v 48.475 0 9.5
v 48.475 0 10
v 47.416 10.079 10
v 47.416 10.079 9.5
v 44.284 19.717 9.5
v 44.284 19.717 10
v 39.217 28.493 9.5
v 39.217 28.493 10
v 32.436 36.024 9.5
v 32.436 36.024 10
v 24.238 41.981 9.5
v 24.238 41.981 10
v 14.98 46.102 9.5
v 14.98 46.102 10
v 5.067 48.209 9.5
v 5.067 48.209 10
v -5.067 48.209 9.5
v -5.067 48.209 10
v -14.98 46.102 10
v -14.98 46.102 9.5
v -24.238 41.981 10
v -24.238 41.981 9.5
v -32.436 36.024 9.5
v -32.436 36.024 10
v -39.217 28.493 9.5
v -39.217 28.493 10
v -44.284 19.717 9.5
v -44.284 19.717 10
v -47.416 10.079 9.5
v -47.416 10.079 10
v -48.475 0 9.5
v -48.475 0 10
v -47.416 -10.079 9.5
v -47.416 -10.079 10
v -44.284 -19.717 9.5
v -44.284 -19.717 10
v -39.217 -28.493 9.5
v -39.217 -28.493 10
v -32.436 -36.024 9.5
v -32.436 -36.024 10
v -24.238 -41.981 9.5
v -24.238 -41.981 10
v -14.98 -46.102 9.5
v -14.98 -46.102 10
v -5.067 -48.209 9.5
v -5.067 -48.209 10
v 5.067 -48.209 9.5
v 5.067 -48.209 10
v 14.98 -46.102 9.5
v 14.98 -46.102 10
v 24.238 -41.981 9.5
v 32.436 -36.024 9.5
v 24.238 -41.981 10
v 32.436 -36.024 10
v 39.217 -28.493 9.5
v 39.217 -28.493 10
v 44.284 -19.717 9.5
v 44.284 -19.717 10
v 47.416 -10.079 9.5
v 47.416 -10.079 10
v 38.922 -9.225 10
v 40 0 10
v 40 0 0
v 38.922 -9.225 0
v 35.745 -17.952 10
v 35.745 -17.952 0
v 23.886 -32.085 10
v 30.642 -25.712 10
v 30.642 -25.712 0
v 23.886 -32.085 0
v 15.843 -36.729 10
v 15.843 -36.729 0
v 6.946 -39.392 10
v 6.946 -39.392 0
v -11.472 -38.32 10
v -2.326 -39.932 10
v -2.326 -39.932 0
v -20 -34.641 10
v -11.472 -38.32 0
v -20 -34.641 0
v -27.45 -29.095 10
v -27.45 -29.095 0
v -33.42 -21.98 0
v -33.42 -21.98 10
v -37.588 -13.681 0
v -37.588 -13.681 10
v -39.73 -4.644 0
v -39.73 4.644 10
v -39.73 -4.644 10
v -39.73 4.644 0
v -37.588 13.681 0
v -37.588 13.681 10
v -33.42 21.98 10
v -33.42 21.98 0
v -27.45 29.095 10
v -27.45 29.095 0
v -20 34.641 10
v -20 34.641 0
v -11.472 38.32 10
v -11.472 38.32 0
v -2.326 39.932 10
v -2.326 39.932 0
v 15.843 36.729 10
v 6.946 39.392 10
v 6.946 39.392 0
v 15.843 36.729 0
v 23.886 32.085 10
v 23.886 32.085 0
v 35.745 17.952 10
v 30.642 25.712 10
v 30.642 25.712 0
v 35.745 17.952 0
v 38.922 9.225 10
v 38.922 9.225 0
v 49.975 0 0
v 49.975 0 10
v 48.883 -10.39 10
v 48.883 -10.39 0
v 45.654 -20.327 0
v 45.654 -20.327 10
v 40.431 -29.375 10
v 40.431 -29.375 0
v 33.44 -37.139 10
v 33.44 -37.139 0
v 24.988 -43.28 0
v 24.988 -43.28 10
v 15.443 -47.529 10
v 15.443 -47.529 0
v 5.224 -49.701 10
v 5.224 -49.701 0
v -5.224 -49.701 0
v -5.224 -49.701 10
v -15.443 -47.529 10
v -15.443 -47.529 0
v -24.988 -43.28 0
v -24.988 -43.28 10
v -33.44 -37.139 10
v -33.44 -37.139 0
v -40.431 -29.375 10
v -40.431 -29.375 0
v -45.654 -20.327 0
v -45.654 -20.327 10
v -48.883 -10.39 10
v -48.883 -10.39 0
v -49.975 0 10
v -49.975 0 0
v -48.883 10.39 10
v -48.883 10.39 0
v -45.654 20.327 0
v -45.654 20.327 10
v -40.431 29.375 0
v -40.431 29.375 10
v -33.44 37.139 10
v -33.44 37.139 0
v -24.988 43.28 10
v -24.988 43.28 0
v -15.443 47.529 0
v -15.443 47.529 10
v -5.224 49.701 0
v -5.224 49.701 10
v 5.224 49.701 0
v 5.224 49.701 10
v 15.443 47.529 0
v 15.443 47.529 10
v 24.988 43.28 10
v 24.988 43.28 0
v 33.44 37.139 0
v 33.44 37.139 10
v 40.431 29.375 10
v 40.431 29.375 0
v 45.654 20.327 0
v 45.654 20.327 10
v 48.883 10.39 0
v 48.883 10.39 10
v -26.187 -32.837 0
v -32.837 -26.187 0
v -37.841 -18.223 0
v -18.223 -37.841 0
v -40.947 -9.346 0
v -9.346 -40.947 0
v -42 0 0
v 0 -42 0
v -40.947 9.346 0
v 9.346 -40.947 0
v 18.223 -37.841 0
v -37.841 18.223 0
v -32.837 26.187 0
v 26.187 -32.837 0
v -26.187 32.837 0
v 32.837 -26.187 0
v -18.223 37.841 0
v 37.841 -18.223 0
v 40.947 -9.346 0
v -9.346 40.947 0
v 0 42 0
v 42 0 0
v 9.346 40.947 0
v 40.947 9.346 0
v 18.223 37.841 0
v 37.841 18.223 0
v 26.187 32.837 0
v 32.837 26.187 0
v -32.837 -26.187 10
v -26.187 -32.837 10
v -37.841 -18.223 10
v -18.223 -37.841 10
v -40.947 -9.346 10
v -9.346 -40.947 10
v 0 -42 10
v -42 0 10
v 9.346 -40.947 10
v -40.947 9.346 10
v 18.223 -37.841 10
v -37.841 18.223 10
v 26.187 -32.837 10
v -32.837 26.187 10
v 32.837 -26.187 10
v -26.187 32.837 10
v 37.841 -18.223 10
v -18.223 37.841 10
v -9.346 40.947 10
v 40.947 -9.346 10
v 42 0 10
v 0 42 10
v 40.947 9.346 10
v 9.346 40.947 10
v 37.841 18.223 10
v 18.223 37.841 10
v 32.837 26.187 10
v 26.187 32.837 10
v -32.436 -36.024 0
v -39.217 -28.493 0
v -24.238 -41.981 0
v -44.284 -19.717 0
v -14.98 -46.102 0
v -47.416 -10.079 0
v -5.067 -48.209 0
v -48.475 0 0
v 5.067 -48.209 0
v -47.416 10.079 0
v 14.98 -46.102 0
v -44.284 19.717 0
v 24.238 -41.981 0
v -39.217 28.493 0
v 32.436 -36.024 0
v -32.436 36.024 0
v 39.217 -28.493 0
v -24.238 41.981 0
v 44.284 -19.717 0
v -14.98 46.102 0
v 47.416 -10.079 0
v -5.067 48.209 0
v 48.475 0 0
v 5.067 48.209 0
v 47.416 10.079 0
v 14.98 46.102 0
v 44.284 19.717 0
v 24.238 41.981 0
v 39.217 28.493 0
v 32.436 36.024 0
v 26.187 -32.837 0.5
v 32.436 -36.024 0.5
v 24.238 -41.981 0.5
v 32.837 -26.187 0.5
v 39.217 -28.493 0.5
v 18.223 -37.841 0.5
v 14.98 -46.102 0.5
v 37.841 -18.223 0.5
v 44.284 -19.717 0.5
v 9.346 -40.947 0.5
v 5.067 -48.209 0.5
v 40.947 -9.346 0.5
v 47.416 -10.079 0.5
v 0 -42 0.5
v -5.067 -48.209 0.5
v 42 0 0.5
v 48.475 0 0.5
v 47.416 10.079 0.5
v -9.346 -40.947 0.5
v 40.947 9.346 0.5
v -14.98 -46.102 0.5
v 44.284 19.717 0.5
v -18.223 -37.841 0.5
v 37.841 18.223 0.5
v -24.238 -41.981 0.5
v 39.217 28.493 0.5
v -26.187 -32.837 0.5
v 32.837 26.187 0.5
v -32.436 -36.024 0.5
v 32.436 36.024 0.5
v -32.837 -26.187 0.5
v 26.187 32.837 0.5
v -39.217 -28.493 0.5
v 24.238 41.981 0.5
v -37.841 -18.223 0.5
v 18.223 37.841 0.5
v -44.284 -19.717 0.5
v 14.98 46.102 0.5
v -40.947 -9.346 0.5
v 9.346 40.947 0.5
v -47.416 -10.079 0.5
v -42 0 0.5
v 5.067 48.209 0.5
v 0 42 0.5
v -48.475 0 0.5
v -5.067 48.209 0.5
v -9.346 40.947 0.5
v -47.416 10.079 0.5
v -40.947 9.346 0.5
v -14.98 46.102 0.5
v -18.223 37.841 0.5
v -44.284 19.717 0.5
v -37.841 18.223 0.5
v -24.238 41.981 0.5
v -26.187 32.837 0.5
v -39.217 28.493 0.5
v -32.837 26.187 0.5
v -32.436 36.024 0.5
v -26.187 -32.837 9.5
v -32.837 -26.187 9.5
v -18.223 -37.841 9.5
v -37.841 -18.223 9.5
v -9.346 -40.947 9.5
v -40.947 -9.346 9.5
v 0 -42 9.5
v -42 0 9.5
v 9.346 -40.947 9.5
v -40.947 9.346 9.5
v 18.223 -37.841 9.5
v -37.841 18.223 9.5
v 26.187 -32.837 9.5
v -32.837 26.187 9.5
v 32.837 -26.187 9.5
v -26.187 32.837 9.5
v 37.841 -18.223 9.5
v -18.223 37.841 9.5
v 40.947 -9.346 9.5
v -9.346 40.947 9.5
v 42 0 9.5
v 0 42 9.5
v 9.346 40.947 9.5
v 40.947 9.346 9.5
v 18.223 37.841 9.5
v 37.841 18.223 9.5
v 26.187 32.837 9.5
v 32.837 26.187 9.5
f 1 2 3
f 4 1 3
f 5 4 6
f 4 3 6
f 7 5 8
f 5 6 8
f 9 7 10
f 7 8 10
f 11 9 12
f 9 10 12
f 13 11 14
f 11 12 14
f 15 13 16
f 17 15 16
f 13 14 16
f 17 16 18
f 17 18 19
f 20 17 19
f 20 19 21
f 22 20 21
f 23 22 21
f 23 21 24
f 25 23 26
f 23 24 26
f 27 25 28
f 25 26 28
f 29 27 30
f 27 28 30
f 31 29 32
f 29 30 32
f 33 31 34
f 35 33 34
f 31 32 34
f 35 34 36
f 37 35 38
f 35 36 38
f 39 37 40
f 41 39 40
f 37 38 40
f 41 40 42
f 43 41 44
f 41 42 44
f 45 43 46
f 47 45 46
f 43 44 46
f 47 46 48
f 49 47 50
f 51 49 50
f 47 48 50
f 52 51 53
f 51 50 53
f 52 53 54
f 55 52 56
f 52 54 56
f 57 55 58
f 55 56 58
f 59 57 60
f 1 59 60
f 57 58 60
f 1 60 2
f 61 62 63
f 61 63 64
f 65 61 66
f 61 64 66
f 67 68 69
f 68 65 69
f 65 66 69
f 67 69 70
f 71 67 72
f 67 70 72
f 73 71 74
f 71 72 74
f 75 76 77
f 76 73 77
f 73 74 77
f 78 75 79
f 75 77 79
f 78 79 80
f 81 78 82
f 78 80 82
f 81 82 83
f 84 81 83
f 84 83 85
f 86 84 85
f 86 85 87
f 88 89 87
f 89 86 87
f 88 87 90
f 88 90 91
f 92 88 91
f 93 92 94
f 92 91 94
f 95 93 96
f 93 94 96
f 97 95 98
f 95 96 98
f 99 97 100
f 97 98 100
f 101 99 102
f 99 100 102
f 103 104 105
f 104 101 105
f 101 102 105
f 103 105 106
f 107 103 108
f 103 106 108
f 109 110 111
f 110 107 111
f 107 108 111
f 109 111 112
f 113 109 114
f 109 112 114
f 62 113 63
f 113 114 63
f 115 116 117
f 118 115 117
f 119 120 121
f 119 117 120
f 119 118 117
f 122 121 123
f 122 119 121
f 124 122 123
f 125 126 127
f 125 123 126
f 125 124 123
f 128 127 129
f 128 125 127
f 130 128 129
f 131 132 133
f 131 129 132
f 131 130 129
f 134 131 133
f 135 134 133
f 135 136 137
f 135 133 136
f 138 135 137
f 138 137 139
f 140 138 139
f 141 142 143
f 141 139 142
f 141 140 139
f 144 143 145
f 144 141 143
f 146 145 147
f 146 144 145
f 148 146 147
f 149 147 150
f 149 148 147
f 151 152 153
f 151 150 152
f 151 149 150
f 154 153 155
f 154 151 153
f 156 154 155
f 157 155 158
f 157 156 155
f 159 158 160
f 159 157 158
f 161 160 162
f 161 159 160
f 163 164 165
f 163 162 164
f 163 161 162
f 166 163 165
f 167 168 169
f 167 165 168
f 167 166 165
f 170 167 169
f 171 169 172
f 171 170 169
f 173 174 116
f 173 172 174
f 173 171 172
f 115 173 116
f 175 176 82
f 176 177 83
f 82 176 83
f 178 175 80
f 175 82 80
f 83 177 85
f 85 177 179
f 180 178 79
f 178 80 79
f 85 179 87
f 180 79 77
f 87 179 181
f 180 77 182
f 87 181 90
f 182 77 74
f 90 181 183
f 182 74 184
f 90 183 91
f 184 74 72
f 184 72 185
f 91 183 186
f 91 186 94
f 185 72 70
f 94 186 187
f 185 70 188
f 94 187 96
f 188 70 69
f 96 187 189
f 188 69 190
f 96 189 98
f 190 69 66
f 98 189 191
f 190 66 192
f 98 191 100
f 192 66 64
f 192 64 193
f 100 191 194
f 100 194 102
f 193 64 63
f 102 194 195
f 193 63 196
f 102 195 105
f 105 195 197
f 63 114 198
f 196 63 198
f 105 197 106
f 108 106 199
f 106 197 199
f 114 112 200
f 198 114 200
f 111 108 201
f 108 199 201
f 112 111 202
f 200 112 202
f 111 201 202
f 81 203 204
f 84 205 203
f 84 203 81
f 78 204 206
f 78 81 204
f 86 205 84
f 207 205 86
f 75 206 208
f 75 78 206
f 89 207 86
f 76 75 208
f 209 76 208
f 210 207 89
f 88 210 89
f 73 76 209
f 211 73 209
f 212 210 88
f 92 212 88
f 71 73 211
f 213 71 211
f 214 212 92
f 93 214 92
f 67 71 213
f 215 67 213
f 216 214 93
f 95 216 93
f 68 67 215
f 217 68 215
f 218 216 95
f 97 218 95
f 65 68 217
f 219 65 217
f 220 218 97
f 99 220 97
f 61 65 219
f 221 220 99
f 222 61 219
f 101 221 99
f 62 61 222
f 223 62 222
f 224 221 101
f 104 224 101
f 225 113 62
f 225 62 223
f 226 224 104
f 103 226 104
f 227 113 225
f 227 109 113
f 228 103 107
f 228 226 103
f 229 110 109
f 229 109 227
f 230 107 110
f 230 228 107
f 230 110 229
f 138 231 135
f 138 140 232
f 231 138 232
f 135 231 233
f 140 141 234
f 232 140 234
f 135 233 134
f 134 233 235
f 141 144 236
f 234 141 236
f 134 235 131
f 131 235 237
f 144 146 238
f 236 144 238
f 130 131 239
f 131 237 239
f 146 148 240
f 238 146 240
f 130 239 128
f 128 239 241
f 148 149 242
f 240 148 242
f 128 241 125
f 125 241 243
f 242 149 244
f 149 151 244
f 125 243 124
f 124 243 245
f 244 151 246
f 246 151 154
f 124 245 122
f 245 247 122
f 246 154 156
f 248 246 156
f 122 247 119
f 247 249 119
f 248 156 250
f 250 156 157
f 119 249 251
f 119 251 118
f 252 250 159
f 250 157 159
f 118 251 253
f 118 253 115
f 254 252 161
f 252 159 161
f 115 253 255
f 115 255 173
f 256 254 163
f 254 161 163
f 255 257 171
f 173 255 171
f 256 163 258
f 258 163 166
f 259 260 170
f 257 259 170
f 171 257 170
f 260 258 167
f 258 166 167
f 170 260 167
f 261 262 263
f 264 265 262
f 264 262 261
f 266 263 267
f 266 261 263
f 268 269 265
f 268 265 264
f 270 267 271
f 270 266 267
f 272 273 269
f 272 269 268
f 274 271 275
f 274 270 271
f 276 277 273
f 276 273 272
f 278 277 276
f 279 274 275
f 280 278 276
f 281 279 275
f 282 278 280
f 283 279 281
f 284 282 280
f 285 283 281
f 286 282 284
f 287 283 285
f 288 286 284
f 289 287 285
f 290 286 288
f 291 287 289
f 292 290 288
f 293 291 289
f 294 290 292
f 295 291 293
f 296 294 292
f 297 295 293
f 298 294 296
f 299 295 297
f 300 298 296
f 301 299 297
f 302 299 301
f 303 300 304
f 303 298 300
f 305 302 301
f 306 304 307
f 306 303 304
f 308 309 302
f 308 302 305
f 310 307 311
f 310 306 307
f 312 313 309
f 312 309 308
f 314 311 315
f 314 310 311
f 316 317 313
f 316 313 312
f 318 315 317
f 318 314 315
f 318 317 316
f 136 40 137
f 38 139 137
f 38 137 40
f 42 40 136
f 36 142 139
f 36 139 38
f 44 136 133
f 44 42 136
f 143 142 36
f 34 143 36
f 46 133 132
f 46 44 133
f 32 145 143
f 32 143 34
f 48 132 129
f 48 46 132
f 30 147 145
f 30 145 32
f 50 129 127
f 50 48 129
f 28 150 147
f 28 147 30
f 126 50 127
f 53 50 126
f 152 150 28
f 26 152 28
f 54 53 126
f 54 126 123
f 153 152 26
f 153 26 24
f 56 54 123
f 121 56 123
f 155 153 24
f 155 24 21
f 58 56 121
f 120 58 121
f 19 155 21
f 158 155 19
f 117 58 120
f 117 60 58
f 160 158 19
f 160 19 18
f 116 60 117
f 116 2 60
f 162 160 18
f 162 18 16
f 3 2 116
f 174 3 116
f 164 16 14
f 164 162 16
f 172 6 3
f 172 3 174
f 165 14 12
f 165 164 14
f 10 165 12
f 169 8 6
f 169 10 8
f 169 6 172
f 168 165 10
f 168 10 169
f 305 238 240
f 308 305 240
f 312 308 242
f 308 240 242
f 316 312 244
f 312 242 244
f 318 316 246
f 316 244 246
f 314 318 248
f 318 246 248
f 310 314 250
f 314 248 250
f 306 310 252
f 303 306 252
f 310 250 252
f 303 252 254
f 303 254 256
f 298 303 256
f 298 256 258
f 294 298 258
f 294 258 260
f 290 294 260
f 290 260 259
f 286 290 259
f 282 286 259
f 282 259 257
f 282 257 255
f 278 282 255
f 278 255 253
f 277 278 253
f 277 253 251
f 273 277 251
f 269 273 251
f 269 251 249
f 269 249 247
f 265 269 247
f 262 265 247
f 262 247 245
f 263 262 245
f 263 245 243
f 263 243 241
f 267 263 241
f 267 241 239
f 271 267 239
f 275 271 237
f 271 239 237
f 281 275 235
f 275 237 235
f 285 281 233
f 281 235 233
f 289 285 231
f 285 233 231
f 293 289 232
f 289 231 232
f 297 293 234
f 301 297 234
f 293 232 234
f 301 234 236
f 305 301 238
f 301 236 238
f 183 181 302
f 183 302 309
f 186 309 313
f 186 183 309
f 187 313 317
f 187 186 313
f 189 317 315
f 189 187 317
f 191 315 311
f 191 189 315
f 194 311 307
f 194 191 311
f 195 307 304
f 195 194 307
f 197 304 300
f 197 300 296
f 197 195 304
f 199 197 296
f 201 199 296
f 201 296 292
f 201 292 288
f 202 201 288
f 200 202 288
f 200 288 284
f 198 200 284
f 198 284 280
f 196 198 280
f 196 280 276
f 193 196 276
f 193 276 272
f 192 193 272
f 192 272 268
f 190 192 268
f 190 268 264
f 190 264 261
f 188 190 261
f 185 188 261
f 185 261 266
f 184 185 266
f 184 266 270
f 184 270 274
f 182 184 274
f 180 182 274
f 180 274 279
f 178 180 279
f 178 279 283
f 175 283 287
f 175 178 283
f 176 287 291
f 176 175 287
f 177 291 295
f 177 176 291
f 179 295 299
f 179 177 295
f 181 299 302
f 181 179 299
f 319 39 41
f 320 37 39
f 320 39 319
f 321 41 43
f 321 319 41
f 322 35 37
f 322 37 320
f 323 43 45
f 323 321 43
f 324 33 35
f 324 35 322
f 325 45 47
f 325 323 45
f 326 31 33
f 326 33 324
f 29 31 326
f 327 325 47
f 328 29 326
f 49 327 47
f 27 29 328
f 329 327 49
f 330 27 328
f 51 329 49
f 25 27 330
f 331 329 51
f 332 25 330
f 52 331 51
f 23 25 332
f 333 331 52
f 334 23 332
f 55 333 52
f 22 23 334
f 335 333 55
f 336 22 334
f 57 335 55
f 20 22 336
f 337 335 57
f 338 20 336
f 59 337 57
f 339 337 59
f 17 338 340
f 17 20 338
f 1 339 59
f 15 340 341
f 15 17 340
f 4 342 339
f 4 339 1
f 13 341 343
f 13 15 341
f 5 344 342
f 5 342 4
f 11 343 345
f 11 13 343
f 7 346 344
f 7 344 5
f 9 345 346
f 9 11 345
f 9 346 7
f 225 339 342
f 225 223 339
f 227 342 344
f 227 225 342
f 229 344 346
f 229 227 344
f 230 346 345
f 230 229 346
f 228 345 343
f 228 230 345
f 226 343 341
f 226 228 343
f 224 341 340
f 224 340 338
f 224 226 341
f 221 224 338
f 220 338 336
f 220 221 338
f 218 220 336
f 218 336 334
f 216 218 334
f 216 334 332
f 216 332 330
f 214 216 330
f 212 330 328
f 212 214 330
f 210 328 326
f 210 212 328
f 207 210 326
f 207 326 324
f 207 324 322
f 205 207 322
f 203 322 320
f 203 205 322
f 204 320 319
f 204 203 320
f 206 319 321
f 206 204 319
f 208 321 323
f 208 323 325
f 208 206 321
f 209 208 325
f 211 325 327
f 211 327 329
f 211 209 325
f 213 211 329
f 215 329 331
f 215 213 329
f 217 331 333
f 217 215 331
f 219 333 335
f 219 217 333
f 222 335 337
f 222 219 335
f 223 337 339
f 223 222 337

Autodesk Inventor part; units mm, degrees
ref_plane "YZ Plane" through (0, 0, 0) normal (1, 0, 0) x (0, 1, 0)
ref_plane "XZ Plane" through (0, 0, 0) normal (0, 1, 0) x (-1, 0, 0)
ref_plane "XY Plane" through (0, 0, 0) normal (0, 0, 1) x (1, 0, 0)
sketch "Sketch1" plane through (0, 0, 0) normal (0, 0, 1) x (1, 0, 0)
  circle A0 centre (0, 0) radius 40
  circle A1 centre (0, 0) radius 49.975
  dimension "d0" = 80
  dimension "d1" = 99.95
extrude "Extrusion1" add sketch "Sketch1" along normal blind 10
sketch "Sketch2" plane through (0, 0, 10) normal (0, 0, 1) x (1, 0, 0)
  circle A0 centre (0, 0) radius 49.975 projected
  circle A1 centre (0, 0) radius 40 projected
  circle A2 centre (0, 0) radius 48.475
  circle A3 centre (0, 0) radius 42
  dimension "d4" = 1.5
  dimension "d5" = 2
extrude "Extrusion2" cut sketch "Sketch2" against normal blind 0.5 contours A2
sketch "Sketch3" plane through (0, 0, 0) normal (0, 0, -1) x (-1, 0, 0)
  circle A0 centre (0, 0) radius 42 projected
  circle A1 centre (0, 0) radius 48.475 projected
extrude "Extrusion3" cut sketch "Sketch3" against normal blind 0.5
properties part number "bearing_100x80x10"
